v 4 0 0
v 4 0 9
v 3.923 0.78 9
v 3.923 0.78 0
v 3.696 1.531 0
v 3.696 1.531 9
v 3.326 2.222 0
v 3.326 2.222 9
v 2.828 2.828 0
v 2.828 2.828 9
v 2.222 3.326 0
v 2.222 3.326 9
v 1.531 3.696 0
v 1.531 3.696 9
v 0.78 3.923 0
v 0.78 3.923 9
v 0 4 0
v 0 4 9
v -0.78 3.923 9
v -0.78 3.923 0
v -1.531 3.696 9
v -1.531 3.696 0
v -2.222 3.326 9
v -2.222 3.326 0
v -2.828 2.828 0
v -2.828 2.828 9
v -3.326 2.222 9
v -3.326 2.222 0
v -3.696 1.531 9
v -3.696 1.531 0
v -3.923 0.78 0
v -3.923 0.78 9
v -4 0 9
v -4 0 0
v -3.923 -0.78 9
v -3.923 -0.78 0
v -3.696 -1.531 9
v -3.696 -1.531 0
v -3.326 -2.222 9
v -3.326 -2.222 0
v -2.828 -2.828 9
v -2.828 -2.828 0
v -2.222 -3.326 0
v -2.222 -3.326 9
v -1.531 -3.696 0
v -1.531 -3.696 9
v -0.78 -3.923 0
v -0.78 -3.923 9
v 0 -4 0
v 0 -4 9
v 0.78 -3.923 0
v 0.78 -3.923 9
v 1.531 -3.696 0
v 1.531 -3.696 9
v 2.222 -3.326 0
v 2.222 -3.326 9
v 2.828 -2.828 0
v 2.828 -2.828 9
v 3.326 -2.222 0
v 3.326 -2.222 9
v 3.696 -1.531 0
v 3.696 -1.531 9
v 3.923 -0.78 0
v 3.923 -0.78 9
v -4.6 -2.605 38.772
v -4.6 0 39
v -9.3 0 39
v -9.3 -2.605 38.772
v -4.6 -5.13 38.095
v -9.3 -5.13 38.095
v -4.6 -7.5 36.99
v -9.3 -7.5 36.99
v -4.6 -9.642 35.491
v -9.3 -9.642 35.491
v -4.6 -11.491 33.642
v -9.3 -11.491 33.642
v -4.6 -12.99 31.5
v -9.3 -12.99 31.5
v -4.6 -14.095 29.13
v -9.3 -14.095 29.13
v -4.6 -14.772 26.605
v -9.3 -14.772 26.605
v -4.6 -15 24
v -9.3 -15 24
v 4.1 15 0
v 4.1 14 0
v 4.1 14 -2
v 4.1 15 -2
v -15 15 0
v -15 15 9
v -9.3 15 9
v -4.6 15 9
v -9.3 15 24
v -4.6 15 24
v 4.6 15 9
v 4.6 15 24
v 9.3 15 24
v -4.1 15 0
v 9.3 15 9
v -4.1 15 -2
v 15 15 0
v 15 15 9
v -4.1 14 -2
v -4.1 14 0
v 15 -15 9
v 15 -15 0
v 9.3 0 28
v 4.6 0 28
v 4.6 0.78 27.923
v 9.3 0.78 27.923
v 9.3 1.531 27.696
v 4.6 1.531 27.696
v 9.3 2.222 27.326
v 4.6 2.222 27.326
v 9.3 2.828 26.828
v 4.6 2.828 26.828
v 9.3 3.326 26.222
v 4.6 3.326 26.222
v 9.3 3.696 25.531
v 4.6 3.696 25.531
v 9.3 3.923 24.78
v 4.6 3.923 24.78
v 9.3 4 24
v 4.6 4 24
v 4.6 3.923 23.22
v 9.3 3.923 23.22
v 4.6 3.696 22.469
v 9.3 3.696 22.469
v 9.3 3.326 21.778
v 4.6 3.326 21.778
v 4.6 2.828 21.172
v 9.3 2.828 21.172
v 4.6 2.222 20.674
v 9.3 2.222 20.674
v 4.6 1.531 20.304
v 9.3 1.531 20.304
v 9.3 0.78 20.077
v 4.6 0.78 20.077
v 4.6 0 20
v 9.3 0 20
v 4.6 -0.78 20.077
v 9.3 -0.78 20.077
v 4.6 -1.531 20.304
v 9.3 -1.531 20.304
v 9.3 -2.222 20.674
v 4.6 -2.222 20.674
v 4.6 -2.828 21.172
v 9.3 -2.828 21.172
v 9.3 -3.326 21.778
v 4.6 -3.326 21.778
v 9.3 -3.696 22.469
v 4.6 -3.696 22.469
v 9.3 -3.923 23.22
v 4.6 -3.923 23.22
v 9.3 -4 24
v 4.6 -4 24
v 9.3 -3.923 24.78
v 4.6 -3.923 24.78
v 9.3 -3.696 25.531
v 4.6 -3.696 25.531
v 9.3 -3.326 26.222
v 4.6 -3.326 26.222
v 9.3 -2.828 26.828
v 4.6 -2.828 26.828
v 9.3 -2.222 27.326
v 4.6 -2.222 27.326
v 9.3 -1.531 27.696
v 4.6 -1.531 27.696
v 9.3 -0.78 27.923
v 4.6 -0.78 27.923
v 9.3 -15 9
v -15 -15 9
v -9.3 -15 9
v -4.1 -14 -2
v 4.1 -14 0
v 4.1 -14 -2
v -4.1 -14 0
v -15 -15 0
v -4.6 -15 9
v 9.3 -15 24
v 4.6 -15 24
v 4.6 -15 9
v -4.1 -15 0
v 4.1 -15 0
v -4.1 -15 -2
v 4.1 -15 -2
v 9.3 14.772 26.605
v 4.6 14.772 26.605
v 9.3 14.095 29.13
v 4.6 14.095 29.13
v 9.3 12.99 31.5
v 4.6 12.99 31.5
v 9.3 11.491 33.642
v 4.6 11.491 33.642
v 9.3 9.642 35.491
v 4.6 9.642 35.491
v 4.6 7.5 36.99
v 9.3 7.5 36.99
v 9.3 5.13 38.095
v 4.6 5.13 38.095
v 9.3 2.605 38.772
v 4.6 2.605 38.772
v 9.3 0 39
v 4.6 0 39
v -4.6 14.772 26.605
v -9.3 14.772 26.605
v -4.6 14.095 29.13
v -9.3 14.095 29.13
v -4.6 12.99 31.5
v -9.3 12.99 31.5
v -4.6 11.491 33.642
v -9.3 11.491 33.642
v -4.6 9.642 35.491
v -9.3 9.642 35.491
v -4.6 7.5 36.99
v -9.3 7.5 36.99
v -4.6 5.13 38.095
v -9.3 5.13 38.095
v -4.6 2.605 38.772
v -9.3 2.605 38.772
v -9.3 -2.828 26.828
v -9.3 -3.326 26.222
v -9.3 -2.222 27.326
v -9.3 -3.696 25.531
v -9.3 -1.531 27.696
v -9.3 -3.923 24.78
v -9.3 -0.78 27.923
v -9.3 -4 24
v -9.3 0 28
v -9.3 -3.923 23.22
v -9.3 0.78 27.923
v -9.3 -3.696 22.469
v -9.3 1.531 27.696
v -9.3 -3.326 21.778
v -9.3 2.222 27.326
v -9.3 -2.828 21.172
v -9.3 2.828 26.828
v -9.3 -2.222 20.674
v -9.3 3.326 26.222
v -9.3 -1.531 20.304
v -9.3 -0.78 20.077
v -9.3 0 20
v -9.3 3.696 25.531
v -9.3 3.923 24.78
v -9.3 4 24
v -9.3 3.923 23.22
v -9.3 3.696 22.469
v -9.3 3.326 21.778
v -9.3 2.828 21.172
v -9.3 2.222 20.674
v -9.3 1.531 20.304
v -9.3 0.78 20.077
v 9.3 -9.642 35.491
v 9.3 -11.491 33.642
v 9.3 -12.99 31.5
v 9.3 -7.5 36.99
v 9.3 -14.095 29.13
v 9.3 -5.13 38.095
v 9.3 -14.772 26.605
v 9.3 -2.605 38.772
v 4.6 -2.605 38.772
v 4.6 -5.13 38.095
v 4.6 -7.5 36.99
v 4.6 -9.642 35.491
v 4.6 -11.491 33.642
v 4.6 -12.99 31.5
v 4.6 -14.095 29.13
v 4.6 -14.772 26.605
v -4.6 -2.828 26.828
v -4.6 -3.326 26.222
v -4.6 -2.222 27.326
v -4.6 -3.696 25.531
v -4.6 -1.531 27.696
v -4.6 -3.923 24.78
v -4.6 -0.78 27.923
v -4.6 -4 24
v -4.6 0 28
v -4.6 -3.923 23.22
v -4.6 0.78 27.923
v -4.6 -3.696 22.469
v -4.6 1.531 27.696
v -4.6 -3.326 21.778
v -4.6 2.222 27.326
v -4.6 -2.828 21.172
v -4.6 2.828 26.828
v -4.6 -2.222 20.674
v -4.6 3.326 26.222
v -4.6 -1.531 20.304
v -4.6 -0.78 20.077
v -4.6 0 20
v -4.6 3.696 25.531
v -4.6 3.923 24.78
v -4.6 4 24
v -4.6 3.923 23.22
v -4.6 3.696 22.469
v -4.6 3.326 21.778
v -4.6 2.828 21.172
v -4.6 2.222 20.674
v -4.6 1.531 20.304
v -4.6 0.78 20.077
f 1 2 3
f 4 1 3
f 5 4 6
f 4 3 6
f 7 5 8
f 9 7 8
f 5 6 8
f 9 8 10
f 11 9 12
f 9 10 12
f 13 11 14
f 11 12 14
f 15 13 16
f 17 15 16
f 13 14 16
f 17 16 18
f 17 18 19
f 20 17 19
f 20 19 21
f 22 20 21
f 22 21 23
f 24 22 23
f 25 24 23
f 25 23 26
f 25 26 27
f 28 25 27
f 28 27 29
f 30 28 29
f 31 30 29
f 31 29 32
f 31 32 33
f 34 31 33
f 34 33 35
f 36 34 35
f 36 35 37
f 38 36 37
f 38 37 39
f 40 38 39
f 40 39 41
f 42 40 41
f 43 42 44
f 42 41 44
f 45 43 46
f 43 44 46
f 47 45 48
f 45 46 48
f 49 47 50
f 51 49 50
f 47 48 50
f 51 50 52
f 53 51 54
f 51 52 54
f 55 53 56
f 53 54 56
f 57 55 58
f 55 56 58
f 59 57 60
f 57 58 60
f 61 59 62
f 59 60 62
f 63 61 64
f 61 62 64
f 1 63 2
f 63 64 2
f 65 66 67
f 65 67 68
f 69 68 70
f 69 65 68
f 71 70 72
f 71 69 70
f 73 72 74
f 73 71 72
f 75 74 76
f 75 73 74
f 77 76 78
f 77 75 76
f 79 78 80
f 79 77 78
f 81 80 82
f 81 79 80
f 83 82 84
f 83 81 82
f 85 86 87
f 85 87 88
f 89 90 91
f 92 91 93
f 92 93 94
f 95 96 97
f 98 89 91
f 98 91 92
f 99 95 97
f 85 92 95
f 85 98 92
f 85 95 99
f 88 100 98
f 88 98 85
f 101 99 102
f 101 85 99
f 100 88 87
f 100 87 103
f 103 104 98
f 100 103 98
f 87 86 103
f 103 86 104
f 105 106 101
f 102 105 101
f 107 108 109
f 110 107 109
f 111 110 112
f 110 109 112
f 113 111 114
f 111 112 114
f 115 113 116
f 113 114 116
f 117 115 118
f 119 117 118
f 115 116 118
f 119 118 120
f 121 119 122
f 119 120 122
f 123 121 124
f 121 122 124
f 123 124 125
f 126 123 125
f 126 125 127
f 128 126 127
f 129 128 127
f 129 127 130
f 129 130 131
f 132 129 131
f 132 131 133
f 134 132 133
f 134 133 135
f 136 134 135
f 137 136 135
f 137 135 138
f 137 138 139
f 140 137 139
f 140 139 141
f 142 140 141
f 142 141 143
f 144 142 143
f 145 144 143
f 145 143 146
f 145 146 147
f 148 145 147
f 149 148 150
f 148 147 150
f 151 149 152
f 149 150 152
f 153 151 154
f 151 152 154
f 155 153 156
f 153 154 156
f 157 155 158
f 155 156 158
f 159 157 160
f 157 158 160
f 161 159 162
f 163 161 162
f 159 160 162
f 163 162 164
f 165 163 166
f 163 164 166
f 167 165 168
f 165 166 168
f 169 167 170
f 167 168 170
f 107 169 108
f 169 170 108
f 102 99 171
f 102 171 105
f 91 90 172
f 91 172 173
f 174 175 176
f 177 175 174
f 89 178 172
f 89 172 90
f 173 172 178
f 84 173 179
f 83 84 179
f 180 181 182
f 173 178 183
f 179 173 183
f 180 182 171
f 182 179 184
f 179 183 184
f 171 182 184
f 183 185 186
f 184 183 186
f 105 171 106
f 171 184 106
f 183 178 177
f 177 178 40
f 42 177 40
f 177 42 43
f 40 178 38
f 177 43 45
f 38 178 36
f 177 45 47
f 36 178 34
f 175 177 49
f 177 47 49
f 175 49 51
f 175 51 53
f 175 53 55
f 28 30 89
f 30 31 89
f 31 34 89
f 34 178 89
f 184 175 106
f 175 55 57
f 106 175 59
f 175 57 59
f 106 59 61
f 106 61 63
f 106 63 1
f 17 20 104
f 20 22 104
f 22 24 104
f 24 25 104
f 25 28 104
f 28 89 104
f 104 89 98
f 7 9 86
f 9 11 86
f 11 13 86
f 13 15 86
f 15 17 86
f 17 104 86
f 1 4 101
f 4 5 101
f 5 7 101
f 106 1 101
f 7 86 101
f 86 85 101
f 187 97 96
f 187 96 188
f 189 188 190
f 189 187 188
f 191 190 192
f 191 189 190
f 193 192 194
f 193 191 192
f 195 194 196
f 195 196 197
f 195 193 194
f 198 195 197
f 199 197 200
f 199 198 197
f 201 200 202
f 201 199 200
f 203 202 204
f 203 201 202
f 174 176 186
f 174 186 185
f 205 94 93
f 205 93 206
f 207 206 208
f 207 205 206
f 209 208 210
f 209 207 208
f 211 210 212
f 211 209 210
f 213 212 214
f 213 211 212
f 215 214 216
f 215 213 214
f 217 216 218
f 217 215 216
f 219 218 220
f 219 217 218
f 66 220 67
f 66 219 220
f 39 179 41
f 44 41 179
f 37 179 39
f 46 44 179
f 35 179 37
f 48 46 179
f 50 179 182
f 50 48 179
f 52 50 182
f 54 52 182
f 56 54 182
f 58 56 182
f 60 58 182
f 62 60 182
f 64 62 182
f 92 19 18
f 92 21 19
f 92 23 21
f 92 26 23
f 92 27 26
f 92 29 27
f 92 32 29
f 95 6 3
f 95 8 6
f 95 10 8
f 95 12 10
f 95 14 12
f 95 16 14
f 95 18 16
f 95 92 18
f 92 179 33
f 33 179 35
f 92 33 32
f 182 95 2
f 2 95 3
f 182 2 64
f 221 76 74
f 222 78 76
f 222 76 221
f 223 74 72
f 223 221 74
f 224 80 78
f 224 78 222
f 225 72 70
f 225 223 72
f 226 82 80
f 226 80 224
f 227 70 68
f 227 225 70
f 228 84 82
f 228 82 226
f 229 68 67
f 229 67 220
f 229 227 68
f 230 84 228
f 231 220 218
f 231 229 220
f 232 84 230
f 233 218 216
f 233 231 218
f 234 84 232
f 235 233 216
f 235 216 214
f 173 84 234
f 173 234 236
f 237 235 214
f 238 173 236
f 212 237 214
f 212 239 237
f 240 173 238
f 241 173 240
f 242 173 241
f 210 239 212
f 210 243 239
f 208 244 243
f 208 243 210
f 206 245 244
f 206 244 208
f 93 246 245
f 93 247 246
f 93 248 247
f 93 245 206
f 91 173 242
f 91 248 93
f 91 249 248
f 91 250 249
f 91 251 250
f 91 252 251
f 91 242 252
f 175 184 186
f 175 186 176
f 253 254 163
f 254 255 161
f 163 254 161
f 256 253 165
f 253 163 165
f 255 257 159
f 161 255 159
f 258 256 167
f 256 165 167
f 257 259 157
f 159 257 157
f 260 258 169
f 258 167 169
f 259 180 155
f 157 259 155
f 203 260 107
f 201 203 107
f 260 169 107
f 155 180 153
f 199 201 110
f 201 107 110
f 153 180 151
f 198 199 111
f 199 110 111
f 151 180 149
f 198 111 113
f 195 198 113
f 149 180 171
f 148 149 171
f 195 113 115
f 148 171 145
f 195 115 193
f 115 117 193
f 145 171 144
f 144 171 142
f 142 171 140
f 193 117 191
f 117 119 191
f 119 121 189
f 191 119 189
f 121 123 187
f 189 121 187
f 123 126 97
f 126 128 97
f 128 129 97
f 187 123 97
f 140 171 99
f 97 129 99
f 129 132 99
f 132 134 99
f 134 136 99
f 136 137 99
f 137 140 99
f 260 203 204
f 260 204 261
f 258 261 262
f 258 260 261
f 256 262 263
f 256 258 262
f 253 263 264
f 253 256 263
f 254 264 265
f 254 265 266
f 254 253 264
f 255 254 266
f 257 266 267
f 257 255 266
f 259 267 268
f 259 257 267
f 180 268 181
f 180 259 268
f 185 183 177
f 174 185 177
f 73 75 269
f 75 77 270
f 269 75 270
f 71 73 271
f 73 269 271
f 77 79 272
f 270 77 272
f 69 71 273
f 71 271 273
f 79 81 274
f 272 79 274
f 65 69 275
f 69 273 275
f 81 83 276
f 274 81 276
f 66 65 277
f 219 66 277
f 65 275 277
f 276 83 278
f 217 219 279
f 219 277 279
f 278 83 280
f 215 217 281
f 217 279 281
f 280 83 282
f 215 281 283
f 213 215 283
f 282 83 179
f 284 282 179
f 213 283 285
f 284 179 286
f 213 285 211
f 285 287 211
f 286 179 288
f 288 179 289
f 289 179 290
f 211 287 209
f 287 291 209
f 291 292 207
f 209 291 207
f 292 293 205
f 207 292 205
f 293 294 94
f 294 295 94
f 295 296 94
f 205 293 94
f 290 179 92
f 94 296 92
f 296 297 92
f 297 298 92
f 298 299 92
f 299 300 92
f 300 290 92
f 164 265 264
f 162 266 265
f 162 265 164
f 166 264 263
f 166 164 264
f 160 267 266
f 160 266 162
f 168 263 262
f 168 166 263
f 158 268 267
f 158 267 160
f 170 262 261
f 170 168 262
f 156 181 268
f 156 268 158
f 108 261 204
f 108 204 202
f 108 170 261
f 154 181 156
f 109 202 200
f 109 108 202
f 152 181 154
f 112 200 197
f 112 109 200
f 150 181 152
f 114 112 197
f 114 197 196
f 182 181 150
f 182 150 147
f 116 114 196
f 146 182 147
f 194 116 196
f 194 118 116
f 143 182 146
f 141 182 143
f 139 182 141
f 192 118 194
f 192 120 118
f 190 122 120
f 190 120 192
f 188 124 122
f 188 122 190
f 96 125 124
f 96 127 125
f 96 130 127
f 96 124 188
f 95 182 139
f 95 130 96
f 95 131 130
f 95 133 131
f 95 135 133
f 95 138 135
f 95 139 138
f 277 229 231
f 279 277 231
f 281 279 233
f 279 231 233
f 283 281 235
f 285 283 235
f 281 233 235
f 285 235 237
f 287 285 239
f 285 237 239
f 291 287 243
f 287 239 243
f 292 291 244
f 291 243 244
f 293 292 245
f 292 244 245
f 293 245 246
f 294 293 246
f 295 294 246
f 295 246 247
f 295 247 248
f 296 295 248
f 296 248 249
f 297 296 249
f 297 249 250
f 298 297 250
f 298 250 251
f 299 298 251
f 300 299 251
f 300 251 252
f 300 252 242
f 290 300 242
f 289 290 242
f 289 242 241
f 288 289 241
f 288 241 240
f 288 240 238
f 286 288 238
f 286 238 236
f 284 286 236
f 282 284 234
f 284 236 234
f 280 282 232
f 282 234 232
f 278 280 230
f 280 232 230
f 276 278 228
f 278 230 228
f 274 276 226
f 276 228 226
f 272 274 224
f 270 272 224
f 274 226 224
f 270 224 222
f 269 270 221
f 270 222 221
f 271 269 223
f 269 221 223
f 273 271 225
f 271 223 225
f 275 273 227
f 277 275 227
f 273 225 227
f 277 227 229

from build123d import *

# Parameters (mm, degrees)
SKETCH_1_W          = 30
SKETCH_1_H          = 30
EXTRUDE_1_DEPTH     = 9
SKETCH_2_W          = 4.7
SKETCH_2_H          = 30
EXTRUDE_2_DEPTH     = 30
CUT_EXTRUDE_START   = -18.6
CUT_EXTRUDE_2_DEPTH = 18.6
SKETCH_4_R          = 4
CUT_EXTRUDE_3_DEPTH = 49.337252715
SKETCH_6_R          = 4
CUT_EXTRUDE_5_DEPTH = 37.742346142
SKETCH_7_W          = 8.2
SKETCH_7_H          = 1
EXTRUDE_3_DEPTH     = 2


# Read off the part's stored shape, not the designer's step: 切除-拉伸2
with BuildPart() as part:
    # 草图1 → 凸台-拉伸1 (new body)
    with BuildSketch(Plane.XY):
        Rectangle(SKETCH_1_W, SKETCH_1_H)
    extrude(amount=EXTRUDE_1_DEPTH)

    # 草图2 → 凸台-拉伸2 (add)
    with BuildSketch(Plane.XY.offset(9)):
        with Locations((-6.95, 0)):
            Rectangle(SKETCH_2_W, SKETCH_2_H)
        with Locations((6.95, 0)):
            Rectangle(SKETCH_2_W, SKETCH_2_H)
    extrude(amount=EXTRUDE_2_DEPTH)

    # 切除-拉伸2 outline → 切除-拉伸2 (cut)
    with BuildSketch(Plane.ZY.offset(9.3).offset(CUT_EXTRUDE_START)):
        with BuildLine():
            Line((39, 15), (24, 15))
            ThreePointArc((24, 15), (34.606601718, 10.606601718), (39, 0))
            Line((39, 0), (39, 15))
        make_face()
        with BuildLine():
            Line((39, -15), (39, 0))
            ThreePointArc((39, 0), (34.606601718, -10.606601718), (24, -15))
            Line((24, -15), (39, -15))
        make_face()
    extrude(amount=CUT_EXTRUDE_2_DEPTH, mode=Mode.SUBTRACT)

    # 草图4 → 切除-拉伸3 (cut, through all)
    with BuildSketch(Plane.ZY.offset(9.3)):
        with Locations((24, 0)):
            Circle(SKETCH_4_R)
    extrude(amount=-CUT_EXTRUDE_3_DEPTH, mode=Mode.SUBTRACT)

    # 草图6 → 切除-拉伸5 (cut, through all)
    with BuildSketch(Plane.XY.offset(9)):
        Circle(SKETCH_6_R)
    extrude(amount=-CUT_EXTRUDE_5_DEPTH, mode=Mode.SUBTRACT)

    # 草图7 → 凸台-拉伸3 (add)
    with BuildSketch(Plane(origin=(0, 0, 0), x_dir=(-1, 0, 0), z_dir=(0, 0, -1))):
        with Locations((0, 14.5)):
            Rectangle(SKETCH_7_W, SKETCH_7_H)
        with Locations((0, -14.5)):
            Rectangle(SKETCH_7_W, SKETCH_7_H)
    extrude(amount=EXTRUDE_3_DEPTH)


solid = part.part
